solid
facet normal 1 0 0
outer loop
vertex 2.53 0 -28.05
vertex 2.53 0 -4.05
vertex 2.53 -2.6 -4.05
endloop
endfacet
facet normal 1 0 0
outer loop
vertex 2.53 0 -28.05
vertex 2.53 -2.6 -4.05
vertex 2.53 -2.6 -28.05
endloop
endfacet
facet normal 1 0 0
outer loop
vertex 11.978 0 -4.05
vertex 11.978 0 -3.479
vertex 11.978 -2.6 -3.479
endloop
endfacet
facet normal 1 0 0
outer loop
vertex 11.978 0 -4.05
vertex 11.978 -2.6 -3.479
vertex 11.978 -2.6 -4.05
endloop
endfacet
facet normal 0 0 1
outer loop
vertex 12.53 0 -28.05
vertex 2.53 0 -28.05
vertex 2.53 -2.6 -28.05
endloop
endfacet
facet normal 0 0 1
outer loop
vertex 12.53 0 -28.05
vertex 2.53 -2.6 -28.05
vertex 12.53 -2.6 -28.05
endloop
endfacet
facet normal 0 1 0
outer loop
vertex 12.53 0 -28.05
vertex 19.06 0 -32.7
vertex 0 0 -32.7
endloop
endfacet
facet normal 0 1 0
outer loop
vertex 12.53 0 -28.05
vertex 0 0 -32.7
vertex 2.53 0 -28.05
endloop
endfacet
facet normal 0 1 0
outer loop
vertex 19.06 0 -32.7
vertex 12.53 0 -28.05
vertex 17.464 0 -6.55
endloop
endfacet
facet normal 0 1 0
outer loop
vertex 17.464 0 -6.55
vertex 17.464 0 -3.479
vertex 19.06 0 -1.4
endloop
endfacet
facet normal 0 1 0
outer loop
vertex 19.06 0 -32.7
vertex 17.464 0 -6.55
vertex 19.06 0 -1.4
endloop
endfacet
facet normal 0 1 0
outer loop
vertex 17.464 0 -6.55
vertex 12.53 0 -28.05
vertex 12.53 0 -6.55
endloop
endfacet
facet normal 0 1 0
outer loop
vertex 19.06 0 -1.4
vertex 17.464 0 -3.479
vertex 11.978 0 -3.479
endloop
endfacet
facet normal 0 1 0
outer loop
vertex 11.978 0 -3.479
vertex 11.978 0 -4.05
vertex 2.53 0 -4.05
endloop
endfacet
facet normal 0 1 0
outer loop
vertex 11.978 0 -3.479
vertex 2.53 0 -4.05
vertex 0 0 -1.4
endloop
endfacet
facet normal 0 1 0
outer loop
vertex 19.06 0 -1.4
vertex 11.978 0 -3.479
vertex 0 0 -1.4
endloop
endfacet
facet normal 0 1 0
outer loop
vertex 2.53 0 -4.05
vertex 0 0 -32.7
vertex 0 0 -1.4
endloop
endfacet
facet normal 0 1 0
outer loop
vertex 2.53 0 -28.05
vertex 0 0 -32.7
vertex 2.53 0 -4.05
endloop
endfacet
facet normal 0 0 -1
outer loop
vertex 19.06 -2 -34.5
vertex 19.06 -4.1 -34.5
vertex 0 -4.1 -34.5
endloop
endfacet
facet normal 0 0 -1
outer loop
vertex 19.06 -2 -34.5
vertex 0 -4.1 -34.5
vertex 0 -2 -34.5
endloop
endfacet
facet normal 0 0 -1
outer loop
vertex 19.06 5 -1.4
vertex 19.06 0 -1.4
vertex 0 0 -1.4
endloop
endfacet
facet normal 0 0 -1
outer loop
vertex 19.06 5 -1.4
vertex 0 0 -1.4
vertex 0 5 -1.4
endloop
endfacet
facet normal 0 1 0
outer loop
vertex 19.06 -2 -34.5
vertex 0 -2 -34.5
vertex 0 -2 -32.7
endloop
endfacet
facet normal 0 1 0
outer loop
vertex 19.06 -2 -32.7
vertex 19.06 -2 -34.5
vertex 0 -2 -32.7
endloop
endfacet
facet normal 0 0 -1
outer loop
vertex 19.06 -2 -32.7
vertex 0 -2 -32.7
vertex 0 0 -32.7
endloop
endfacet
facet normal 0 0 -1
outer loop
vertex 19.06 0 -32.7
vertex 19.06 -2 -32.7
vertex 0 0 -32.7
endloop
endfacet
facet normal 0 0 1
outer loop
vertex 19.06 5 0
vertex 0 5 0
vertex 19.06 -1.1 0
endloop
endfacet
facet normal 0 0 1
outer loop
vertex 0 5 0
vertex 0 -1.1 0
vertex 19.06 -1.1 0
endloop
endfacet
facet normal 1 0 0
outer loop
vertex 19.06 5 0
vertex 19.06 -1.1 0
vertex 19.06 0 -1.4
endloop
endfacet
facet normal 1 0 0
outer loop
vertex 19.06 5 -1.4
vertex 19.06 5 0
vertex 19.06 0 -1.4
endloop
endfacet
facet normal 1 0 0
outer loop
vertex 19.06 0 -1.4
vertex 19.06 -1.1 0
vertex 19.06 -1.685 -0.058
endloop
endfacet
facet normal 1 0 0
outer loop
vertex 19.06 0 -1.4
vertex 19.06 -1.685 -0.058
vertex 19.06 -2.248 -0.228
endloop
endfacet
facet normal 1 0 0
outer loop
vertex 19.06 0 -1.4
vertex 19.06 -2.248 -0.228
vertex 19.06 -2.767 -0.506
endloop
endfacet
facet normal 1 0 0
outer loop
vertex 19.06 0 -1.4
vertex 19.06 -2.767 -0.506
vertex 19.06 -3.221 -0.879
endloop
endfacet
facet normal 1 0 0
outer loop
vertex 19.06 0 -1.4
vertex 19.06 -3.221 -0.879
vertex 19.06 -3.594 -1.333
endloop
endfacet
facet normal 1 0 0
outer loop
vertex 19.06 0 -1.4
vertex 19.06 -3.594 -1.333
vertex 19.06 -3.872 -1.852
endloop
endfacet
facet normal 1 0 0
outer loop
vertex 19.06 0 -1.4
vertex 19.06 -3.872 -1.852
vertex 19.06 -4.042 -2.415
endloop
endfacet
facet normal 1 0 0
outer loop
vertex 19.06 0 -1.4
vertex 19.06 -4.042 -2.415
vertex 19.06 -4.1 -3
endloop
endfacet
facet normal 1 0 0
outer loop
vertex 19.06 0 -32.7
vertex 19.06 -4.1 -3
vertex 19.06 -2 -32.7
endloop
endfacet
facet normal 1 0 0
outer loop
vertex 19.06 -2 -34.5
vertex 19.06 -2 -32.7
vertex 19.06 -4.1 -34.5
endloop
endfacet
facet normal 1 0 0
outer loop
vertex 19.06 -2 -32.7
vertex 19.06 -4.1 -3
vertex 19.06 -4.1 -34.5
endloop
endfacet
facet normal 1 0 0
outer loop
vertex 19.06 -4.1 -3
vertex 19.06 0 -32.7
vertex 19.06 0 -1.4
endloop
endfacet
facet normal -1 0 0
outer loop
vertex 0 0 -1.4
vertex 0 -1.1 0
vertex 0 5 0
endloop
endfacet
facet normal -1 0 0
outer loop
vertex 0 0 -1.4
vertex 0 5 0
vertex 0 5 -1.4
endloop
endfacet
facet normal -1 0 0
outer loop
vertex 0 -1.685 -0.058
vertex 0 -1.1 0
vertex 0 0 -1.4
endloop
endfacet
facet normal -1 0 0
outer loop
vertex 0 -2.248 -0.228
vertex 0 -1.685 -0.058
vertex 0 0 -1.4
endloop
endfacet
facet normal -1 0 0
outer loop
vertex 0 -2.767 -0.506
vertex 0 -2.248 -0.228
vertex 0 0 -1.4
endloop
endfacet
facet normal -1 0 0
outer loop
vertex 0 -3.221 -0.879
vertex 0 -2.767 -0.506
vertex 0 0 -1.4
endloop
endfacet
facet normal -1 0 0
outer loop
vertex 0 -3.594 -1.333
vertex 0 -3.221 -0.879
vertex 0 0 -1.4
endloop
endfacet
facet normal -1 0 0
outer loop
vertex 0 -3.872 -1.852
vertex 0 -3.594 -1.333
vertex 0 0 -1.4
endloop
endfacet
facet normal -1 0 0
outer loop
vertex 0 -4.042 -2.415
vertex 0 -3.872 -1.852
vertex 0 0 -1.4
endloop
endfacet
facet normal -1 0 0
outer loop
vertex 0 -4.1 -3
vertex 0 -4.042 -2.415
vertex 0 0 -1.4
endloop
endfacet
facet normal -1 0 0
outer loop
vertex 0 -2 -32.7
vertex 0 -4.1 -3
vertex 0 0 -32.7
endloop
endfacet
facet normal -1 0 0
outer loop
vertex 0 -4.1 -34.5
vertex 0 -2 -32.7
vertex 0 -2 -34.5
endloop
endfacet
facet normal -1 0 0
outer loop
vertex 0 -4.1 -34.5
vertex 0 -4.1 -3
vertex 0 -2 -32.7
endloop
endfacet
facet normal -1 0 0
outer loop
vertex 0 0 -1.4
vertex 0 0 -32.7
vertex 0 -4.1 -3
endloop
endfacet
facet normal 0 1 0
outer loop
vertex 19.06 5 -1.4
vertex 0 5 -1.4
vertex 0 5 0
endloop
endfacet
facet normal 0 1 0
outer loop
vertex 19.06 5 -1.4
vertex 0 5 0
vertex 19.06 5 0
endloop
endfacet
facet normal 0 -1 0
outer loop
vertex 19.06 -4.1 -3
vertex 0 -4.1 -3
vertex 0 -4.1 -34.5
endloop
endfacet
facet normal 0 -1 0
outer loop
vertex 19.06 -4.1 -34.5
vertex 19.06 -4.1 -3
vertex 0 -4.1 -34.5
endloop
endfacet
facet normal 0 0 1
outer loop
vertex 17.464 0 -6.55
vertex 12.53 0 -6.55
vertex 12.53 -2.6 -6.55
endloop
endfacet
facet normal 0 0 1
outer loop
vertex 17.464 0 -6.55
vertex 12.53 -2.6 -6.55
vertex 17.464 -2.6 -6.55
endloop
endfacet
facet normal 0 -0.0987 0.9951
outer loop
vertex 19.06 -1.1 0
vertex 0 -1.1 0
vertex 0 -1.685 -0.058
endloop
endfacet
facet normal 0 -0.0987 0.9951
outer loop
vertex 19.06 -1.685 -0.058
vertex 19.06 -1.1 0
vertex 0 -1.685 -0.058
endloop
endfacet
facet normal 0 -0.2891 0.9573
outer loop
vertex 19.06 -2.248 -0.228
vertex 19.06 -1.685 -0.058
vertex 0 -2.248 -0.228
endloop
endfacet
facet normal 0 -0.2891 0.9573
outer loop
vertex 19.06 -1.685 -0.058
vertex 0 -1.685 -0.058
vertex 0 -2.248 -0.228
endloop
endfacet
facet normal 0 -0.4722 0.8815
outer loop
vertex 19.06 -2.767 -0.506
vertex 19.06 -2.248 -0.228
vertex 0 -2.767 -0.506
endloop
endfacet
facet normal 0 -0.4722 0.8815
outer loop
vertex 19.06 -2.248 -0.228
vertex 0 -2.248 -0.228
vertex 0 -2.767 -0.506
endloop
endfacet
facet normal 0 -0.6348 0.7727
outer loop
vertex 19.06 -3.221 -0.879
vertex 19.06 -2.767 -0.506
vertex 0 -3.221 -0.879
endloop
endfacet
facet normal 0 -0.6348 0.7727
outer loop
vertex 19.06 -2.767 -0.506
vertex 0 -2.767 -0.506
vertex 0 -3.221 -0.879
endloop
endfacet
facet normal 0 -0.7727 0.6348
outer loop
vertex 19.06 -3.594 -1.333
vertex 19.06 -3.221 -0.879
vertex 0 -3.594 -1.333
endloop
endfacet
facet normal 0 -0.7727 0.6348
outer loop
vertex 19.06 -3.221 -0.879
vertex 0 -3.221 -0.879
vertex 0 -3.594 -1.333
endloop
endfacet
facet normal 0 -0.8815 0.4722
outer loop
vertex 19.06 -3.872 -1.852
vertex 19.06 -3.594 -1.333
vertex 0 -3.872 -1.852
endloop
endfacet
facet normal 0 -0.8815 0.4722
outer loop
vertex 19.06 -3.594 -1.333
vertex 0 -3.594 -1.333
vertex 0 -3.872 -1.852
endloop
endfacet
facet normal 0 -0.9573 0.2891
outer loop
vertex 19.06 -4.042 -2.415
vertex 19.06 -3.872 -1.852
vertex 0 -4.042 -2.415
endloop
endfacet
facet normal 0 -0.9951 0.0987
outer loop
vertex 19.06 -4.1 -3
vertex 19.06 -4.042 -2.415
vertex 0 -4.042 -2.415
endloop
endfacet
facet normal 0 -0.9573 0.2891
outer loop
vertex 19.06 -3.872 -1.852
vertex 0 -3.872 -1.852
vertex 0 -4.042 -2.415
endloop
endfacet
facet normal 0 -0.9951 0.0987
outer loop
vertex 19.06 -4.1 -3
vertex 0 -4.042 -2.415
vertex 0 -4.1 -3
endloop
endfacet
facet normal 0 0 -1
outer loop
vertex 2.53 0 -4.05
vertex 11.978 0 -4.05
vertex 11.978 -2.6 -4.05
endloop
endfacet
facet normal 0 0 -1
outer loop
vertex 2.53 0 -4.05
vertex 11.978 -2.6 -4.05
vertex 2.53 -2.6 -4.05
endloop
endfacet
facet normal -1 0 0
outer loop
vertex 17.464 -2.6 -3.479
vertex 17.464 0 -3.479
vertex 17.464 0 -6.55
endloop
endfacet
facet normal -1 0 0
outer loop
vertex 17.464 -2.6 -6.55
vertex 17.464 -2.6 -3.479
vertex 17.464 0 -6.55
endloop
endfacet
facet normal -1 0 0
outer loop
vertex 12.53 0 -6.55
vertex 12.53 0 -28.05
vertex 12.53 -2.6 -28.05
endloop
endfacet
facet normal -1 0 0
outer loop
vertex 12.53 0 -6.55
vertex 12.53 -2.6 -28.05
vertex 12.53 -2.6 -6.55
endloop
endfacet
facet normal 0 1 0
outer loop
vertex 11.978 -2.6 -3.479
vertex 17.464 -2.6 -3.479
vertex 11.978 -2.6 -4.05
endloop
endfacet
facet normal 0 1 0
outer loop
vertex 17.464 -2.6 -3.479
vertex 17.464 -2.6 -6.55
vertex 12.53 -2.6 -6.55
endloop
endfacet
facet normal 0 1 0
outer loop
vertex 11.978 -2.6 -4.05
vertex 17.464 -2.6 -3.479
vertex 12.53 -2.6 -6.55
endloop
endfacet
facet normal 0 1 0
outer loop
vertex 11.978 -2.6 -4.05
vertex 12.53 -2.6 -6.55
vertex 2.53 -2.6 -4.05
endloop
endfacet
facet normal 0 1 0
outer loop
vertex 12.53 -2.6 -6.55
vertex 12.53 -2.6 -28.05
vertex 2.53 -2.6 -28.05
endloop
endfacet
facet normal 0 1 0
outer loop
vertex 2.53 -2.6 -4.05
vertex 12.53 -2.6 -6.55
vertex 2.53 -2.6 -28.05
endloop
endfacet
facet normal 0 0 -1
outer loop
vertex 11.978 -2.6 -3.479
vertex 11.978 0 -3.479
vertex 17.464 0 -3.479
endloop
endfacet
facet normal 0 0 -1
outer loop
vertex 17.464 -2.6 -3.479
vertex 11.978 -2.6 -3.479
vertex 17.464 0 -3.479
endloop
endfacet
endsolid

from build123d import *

# Parameters (mm, degrees)
EXTRUDE_1_DEPTH     = 19.06
CUT_EXTRUDE_1_DEPTH = 2.6
SKETCH_3_W          = 19.06
SKETCH_3_H          = 1.9
EXTRUDE_2_DEPTH     = 5
CUT_EXTRUDE_2_REACH = 41.731
SKETCH_4_W          = 1.8
SKETCH_4_H          = 2
SKETCH_5_W          = 0.5
SKETCH_5_H          = 5
CUT_EXTRUDE_3_DEPTH = 40.730763899


with BuildPart() as part:
    # 草图1 → 凸台-拉伸1 (new body)
    with BuildSketch(Plane(origin=(0, 0, 0), x_dir=(0, 0, -1), z_dir=(1, 0, 0))):
        with BuildLine():
            Line((0, 0), (0, -1.1))
            ThreePointArc((0, -1.1), (0.878679656, -3.221320344), (3, -4.1))
            Line((3, -4.1), (34.5, -4.1))
            Line((34.5, -4.1), (34.5, 0))
            Line((34.5, 0), (0, 0))
        make_face()
    extrude(amount=EXTRUDE_1_DEPTH)

    # 草图2 → 切除-拉伸1 (cut)
    with BuildSketch(Plane(origin=(0, 0, 0), x_dir=(1, 0, 0), z_dir=(0, 1, 0))):
        Polygon((2.53, 28.05), (12.53, 28.05), (12.53, 6.55), (17.464199463, 6.55), (17.464199463, 4.05), (17.464199463, 3.479016937), (12.53, 3.479016937), (11.977918136, 3.479016937), (11.977918136, 4.05), (2.53, 4.05), align=None)
    extrude(amount=-CUT_EXTRUDE_1_DEPTH, mode=Mode.SUBTRACT)

    # 草图3 → 凸台-拉伸2 (add)
    with BuildSketch(Plane(origin=(0, 0, 0), x_dir=(1, 0, 0), z_dir=(0, 1, 0))):
        with Locations((9.53, 0.95)):
            Rectangle(SKETCH_3_W, SKETCH_3_H)
    extrude(amount=EXTRUDE_2_DEPTH)

    # 草图4 → 切除-拉伸2 (cut, up to next)
    with BuildSketch(Plane.ZY, mode=Mode.PRIVATE) as cut_extrude_2_sk1:
        with Locations((-33.6, -1)):
            Rectangle(SKETCH_4_W, SKETCH_4_H)
    cut_extrude_2_tool1 = extrude(cut_extrude_2_sk1.sketch, amount=-CUT_EXTRUDE_2_REACH, mode=Mode.PRIVATE) & part.part
    add(cut_extrude_2_tool1.solids().sort_by_distance((0, -1, -33.6))[0], mode=Mode.SUBTRACT)

    # 草图5 → 切除-拉伸3 (cut, through all)
    with BuildSketch(Plane(origin=(19.06, 0, 0), x_dir=(0, 0, -1), z_dir=(1, 0, 0))):
        with Locations((1.65, 2.5)):
            Rectangle(SKETCH_5_W, SKETCH_5_H)
    extrude(amount=-CUT_EXTRUDE_3_DEPTH, mode=Mode.SUBTRACT)


solid = part.part
